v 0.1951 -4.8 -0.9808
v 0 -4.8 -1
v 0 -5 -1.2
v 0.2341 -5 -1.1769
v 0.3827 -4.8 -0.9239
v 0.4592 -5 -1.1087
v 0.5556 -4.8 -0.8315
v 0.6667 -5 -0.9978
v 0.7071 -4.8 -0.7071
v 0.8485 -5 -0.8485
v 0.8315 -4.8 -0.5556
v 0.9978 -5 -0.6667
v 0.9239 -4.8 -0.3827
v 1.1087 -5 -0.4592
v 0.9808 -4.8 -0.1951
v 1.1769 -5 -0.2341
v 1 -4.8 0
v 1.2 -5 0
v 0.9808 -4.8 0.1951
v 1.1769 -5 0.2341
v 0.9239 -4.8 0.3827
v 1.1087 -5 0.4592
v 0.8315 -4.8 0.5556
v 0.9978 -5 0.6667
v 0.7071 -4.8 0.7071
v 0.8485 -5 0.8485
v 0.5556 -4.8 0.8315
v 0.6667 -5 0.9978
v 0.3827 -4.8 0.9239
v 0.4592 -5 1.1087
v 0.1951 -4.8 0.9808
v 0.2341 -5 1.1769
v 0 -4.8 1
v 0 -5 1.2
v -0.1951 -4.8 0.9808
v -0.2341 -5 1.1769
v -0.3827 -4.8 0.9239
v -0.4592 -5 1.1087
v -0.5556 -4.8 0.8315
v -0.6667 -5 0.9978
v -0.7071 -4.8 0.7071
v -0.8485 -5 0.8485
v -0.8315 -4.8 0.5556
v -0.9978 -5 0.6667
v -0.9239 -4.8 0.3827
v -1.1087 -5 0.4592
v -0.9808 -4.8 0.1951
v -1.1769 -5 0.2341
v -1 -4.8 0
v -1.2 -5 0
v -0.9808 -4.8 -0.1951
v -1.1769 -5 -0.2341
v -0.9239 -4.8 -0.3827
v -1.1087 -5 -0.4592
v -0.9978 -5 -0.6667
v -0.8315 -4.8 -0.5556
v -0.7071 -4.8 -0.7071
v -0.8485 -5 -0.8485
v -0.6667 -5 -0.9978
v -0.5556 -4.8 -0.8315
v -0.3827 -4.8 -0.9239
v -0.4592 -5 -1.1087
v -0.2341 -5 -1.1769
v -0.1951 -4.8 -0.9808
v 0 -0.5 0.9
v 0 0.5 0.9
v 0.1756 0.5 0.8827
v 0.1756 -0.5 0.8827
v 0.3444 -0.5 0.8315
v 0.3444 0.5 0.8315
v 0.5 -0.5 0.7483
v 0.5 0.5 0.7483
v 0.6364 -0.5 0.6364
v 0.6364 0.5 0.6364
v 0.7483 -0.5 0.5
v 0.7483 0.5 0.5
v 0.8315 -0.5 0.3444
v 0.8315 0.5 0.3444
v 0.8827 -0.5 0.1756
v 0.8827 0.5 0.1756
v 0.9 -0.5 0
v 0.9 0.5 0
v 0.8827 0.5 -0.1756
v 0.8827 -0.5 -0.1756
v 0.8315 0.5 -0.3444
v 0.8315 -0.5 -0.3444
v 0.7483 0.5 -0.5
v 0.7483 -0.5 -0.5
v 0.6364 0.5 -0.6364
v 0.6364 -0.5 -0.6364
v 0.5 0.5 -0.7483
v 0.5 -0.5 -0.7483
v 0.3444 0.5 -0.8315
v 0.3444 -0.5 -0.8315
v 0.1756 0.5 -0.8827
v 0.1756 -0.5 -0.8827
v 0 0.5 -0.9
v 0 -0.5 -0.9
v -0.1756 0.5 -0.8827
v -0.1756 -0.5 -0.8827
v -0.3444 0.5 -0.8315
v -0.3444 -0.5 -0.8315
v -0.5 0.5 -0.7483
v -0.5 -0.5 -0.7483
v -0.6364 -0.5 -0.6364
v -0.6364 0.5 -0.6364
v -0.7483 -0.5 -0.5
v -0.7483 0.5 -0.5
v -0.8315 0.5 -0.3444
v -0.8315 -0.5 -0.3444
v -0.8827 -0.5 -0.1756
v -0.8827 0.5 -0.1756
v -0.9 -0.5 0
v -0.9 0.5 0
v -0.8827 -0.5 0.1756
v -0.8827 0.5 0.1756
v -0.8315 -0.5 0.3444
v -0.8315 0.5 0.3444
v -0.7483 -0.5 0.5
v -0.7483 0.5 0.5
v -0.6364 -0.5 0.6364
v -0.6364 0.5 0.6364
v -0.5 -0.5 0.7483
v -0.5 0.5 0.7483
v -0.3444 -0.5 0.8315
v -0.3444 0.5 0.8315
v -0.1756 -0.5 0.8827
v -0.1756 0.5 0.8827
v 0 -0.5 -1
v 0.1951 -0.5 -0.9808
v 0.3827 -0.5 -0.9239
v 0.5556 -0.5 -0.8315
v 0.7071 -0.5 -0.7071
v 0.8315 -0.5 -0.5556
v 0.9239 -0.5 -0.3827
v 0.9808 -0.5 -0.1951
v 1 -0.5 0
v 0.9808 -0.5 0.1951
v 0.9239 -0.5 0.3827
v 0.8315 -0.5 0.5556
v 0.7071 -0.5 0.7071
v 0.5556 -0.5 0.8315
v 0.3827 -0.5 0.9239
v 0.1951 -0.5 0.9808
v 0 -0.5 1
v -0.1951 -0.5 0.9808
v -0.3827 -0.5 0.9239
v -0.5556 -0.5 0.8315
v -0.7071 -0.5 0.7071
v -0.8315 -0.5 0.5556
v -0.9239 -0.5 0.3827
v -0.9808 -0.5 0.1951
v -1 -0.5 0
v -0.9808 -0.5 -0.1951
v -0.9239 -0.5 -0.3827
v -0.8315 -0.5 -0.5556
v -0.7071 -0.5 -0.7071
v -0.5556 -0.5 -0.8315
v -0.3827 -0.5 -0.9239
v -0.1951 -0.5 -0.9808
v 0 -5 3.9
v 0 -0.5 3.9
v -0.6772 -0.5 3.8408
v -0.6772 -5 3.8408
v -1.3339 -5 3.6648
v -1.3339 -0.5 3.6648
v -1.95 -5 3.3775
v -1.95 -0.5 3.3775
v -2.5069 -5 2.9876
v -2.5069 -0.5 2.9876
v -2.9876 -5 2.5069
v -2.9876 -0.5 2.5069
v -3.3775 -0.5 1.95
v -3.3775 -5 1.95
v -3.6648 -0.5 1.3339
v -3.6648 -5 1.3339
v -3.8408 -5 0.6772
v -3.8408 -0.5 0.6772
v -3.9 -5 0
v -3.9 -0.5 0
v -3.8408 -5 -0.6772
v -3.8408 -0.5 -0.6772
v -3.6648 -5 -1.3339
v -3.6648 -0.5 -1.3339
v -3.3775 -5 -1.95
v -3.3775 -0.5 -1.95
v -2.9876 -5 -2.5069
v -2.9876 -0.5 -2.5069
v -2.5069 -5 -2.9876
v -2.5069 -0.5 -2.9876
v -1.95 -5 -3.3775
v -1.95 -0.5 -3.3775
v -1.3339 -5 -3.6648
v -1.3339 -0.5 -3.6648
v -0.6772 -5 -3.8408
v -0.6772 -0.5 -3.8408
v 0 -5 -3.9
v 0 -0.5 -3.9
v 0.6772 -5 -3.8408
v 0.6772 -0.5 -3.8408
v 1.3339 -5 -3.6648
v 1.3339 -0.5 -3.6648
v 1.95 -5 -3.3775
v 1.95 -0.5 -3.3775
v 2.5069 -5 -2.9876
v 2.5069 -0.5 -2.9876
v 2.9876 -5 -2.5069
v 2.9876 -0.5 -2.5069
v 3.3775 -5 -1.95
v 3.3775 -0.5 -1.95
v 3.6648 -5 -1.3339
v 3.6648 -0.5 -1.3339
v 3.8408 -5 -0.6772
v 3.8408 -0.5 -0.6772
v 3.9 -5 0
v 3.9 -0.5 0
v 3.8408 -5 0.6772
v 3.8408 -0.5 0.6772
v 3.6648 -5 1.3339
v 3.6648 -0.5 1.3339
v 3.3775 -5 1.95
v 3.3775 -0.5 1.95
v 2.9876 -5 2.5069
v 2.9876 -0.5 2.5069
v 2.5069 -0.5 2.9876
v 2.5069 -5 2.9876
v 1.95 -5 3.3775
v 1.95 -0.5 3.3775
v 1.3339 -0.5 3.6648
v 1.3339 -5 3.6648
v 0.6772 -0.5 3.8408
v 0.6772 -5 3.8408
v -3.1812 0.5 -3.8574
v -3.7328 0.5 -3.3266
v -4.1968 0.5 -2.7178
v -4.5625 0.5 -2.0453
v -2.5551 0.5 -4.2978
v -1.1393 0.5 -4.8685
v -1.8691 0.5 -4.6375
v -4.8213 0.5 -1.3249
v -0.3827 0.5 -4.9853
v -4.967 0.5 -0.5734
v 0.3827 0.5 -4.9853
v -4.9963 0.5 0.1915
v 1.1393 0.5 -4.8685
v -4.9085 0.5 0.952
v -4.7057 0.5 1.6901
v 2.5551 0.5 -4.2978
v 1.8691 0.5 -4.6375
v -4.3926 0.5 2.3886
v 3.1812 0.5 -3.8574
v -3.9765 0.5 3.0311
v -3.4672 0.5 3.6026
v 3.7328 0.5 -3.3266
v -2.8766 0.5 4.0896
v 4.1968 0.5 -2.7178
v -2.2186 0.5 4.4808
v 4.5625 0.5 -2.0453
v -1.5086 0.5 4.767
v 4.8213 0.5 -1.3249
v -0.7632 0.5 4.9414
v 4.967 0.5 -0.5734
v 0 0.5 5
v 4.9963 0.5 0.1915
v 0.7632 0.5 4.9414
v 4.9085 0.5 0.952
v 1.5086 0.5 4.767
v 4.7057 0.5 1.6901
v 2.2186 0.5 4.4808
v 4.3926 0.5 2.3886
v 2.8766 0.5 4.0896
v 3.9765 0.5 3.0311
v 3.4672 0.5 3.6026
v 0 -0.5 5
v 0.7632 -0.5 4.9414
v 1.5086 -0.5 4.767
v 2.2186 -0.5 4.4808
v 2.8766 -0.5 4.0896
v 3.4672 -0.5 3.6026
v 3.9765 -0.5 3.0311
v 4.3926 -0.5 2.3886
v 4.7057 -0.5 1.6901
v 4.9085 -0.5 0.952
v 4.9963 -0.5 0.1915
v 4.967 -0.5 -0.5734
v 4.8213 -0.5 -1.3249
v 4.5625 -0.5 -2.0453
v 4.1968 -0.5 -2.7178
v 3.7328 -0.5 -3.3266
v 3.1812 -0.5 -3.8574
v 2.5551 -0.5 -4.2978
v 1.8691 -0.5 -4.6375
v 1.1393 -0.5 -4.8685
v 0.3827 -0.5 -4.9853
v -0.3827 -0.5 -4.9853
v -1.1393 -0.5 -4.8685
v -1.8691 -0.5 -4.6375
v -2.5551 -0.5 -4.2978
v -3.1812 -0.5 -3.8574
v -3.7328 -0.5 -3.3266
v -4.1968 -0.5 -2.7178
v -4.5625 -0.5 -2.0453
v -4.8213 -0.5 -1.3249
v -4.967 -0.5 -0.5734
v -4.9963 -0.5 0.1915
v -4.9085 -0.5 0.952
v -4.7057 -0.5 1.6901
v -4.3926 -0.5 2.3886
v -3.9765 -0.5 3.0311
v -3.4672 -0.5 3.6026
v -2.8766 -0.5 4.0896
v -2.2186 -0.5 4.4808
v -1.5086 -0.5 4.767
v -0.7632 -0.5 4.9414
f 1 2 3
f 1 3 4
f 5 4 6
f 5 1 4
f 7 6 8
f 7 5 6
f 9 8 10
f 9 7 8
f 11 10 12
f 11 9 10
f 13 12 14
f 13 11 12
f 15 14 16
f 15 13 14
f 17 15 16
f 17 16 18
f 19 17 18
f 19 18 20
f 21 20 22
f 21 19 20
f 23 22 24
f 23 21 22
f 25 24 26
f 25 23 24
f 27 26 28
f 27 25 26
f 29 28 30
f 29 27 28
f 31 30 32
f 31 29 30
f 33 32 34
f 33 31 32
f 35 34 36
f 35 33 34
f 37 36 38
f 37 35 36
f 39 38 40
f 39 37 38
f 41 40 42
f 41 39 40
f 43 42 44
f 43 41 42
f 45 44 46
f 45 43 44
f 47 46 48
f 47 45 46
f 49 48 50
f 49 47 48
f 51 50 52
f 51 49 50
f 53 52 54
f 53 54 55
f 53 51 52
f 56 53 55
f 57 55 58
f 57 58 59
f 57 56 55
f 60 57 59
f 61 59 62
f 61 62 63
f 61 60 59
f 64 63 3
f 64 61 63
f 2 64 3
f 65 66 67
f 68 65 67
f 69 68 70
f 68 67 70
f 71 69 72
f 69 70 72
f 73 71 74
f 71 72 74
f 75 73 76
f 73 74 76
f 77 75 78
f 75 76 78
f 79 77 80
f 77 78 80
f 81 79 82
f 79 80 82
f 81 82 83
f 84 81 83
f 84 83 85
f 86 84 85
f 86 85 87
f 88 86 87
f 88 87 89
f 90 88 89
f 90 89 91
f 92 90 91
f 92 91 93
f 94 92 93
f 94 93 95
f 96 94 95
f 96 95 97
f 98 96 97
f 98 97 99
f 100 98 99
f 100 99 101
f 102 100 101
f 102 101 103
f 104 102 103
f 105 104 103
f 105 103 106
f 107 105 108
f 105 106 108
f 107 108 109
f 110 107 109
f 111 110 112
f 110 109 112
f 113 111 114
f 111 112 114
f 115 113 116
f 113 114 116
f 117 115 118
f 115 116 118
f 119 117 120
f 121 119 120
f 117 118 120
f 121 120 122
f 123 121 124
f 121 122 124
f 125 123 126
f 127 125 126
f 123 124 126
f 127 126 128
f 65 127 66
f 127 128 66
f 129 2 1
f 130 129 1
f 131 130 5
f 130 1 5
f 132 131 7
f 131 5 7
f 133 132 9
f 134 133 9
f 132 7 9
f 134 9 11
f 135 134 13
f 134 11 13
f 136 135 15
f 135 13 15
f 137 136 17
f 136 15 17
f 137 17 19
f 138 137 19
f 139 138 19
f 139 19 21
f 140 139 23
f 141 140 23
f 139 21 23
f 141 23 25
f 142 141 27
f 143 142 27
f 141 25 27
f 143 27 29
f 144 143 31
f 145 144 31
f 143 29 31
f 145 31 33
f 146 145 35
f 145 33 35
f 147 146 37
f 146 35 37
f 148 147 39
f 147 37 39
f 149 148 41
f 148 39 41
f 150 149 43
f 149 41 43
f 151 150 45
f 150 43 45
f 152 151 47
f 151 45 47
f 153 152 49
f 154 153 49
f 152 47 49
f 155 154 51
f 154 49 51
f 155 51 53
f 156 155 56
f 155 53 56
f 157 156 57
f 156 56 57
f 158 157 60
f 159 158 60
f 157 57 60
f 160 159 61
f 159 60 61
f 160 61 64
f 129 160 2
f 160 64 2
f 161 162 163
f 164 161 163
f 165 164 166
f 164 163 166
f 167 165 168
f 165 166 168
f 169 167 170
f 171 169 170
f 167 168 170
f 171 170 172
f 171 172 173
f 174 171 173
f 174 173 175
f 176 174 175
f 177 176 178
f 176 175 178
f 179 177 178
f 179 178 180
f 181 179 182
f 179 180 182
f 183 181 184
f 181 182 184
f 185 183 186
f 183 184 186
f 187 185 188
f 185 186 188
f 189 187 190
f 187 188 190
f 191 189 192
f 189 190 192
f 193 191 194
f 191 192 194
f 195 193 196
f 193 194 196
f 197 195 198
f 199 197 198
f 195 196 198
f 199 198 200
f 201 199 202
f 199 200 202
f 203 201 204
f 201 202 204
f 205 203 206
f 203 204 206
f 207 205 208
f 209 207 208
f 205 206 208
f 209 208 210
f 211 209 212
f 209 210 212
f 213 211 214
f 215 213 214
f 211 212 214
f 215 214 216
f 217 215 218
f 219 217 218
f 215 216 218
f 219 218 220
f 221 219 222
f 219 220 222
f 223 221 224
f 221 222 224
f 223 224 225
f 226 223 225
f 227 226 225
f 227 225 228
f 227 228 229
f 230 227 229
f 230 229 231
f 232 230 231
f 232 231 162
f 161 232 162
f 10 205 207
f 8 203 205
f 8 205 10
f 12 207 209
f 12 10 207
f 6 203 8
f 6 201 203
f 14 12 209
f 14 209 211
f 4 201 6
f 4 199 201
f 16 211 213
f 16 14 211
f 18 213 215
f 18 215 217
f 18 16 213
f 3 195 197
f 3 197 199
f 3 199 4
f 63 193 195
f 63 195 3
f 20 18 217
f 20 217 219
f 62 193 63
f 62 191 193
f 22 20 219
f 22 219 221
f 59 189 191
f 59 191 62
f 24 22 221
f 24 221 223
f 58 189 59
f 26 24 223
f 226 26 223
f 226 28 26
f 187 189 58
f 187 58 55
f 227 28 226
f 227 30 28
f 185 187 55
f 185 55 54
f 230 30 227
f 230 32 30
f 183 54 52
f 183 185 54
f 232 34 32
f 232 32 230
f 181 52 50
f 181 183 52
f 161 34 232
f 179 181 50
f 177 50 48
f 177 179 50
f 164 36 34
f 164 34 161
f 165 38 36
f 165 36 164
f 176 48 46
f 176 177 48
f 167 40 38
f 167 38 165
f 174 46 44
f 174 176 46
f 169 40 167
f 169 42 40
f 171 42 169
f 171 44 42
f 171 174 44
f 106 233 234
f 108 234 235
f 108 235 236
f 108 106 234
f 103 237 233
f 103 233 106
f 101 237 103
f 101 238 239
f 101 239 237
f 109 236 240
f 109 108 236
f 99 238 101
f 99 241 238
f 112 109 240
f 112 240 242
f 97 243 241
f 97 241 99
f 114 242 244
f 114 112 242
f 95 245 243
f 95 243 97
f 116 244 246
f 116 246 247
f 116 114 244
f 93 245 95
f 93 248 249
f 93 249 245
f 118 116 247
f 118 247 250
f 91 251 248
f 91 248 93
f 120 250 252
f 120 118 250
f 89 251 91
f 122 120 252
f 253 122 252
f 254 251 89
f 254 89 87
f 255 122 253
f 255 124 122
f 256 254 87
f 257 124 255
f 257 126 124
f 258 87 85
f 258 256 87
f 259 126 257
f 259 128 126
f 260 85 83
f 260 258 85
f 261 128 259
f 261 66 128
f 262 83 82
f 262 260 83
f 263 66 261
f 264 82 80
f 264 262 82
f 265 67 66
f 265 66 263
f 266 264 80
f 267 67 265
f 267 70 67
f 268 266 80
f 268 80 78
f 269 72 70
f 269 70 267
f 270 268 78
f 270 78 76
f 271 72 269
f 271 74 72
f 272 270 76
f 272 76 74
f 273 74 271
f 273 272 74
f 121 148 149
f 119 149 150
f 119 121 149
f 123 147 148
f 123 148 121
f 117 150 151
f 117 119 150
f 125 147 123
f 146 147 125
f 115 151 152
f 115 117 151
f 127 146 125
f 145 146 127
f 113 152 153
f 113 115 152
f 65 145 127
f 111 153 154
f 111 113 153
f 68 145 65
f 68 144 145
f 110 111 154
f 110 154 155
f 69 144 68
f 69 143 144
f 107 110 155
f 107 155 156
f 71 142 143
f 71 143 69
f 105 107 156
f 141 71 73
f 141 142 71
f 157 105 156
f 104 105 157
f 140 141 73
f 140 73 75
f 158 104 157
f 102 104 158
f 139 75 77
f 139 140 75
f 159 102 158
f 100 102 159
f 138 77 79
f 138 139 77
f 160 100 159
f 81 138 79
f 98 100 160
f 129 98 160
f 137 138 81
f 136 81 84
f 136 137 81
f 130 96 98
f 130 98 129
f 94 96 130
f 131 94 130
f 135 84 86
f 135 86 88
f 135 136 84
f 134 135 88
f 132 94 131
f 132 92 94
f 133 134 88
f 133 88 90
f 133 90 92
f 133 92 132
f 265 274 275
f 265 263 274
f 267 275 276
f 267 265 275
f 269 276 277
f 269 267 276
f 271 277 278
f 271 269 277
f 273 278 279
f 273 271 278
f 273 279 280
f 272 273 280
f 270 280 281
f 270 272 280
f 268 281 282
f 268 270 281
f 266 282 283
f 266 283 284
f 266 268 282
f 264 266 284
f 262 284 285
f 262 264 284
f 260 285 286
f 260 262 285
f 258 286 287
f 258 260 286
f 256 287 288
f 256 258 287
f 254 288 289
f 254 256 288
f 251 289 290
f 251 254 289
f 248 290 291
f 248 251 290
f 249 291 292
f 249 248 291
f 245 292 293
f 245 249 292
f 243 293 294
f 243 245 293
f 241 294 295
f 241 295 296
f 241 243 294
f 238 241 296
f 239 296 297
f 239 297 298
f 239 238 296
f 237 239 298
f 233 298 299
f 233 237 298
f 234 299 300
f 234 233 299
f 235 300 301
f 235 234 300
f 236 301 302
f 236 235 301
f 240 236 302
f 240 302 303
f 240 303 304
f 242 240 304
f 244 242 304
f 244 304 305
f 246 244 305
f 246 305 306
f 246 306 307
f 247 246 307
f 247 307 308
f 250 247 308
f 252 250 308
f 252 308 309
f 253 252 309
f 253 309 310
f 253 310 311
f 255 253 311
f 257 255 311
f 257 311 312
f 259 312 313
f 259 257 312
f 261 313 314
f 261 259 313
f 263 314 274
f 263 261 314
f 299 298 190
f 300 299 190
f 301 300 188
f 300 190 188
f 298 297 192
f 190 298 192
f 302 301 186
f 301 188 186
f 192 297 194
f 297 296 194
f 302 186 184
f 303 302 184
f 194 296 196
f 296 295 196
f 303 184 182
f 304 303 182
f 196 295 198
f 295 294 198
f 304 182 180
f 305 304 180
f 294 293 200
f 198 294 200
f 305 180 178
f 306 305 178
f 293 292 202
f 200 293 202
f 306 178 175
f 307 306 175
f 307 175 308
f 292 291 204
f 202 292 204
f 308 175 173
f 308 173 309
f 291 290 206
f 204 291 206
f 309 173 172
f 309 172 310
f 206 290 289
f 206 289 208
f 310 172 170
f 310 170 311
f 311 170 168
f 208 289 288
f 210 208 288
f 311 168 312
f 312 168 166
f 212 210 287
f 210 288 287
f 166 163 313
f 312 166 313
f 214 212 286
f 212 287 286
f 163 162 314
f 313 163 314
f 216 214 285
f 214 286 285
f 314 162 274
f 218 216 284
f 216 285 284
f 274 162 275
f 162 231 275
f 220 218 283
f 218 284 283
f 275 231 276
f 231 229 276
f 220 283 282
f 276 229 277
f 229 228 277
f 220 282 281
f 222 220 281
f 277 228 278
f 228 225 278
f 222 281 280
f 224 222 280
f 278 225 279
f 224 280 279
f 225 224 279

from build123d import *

# Parameters (mm, degrees)
SKETCH1_R           = 5
BOSS_EXTRUDE1_DEPTH = 0.5
SKETCH2_R           = 3.9
BOSS_EXTRUDE2_DEPTH = 4.5
SKETCH4_R           = 1
CUT_EXTRUDE1_DEPTH  = 4.5
CUT_EXTRUDE2_REACH  = 10.958
SKETCH5_R           = 0.9
CHAMFER1_SIZE       = 0.2


with BuildPart() as part:
    # Sketch1 → Boss-Extrude1 (new, symmetric)
    with BuildSketch(Plane(origin=(0, 0, 0), x_dir=(1, 0, 0), z_dir=(0, 1, 0))):
        with Locations(Location((0, 0, 0), (0, 0, 270))):
            Circle(SKETCH1_R)
    extrude(amount=BOSS_EXTRUDE1_DEPTH, both=True)

    # Sketch2 → Boss-Extrude2 (add)
    with BuildSketch(Plane(origin=(0, -0.5, 0), x_dir=(-1, 0, 0), z_dir=(0, -1, 0))):
        with Locations(Location((0, 0, 0), (0, 0, 270))):
            Circle(SKETCH2_R)
    extrude(amount=BOSS_EXTRUDE2_DEPTH)

    # Sketch4 → Cut-Extrude1 (cut)
    with BuildSketch(Plane(origin=(0, -5, 0), x_dir=(-1, 0, 0), z_dir=(0, -1, 0))):
        with Locations(Location((0, 0, 0), (0, 0, 90))):
            Circle(SKETCH4_R)
    extrude(amount=-CUT_EXTRUDE1_DEPTH, mode=Mode.SUBTRACT)

    # Sketch5 → Cut-Extrude2 (cut, up to next)
    with BuildSketch(Plane(origin=(0, 0.5, 0), x_dir=(1, 0, 0), z_dir=(0, 1, 0)), mode=Mode.PRIVATE) as cut_extrude2_sk1:
        with Locations(Location((0, 0, 0), (0, 0, 270))):
            Circle(SKETCH5_R)
    cut_extrude2_tool1 = extrude(cut_extrude2_sk1.sketch, amount=-CUT_EXTRUDE2_REACH, mode=Mode.PRIVATE) & part.part
    add(cut_extrude2_tool1.solids().sort_by_distance((0, 0.5, 0))[0], mode=Mode.SUBTRACT)

    # Chamfer1
    chamfer1_edges = [part.edges().sort_by_distance(p)[0] for p in [
        (0, -5, 1),
    ]]
    chamfer(chamfer1_edges, length=CHAMFER1_SIZE)


solid = part.part
